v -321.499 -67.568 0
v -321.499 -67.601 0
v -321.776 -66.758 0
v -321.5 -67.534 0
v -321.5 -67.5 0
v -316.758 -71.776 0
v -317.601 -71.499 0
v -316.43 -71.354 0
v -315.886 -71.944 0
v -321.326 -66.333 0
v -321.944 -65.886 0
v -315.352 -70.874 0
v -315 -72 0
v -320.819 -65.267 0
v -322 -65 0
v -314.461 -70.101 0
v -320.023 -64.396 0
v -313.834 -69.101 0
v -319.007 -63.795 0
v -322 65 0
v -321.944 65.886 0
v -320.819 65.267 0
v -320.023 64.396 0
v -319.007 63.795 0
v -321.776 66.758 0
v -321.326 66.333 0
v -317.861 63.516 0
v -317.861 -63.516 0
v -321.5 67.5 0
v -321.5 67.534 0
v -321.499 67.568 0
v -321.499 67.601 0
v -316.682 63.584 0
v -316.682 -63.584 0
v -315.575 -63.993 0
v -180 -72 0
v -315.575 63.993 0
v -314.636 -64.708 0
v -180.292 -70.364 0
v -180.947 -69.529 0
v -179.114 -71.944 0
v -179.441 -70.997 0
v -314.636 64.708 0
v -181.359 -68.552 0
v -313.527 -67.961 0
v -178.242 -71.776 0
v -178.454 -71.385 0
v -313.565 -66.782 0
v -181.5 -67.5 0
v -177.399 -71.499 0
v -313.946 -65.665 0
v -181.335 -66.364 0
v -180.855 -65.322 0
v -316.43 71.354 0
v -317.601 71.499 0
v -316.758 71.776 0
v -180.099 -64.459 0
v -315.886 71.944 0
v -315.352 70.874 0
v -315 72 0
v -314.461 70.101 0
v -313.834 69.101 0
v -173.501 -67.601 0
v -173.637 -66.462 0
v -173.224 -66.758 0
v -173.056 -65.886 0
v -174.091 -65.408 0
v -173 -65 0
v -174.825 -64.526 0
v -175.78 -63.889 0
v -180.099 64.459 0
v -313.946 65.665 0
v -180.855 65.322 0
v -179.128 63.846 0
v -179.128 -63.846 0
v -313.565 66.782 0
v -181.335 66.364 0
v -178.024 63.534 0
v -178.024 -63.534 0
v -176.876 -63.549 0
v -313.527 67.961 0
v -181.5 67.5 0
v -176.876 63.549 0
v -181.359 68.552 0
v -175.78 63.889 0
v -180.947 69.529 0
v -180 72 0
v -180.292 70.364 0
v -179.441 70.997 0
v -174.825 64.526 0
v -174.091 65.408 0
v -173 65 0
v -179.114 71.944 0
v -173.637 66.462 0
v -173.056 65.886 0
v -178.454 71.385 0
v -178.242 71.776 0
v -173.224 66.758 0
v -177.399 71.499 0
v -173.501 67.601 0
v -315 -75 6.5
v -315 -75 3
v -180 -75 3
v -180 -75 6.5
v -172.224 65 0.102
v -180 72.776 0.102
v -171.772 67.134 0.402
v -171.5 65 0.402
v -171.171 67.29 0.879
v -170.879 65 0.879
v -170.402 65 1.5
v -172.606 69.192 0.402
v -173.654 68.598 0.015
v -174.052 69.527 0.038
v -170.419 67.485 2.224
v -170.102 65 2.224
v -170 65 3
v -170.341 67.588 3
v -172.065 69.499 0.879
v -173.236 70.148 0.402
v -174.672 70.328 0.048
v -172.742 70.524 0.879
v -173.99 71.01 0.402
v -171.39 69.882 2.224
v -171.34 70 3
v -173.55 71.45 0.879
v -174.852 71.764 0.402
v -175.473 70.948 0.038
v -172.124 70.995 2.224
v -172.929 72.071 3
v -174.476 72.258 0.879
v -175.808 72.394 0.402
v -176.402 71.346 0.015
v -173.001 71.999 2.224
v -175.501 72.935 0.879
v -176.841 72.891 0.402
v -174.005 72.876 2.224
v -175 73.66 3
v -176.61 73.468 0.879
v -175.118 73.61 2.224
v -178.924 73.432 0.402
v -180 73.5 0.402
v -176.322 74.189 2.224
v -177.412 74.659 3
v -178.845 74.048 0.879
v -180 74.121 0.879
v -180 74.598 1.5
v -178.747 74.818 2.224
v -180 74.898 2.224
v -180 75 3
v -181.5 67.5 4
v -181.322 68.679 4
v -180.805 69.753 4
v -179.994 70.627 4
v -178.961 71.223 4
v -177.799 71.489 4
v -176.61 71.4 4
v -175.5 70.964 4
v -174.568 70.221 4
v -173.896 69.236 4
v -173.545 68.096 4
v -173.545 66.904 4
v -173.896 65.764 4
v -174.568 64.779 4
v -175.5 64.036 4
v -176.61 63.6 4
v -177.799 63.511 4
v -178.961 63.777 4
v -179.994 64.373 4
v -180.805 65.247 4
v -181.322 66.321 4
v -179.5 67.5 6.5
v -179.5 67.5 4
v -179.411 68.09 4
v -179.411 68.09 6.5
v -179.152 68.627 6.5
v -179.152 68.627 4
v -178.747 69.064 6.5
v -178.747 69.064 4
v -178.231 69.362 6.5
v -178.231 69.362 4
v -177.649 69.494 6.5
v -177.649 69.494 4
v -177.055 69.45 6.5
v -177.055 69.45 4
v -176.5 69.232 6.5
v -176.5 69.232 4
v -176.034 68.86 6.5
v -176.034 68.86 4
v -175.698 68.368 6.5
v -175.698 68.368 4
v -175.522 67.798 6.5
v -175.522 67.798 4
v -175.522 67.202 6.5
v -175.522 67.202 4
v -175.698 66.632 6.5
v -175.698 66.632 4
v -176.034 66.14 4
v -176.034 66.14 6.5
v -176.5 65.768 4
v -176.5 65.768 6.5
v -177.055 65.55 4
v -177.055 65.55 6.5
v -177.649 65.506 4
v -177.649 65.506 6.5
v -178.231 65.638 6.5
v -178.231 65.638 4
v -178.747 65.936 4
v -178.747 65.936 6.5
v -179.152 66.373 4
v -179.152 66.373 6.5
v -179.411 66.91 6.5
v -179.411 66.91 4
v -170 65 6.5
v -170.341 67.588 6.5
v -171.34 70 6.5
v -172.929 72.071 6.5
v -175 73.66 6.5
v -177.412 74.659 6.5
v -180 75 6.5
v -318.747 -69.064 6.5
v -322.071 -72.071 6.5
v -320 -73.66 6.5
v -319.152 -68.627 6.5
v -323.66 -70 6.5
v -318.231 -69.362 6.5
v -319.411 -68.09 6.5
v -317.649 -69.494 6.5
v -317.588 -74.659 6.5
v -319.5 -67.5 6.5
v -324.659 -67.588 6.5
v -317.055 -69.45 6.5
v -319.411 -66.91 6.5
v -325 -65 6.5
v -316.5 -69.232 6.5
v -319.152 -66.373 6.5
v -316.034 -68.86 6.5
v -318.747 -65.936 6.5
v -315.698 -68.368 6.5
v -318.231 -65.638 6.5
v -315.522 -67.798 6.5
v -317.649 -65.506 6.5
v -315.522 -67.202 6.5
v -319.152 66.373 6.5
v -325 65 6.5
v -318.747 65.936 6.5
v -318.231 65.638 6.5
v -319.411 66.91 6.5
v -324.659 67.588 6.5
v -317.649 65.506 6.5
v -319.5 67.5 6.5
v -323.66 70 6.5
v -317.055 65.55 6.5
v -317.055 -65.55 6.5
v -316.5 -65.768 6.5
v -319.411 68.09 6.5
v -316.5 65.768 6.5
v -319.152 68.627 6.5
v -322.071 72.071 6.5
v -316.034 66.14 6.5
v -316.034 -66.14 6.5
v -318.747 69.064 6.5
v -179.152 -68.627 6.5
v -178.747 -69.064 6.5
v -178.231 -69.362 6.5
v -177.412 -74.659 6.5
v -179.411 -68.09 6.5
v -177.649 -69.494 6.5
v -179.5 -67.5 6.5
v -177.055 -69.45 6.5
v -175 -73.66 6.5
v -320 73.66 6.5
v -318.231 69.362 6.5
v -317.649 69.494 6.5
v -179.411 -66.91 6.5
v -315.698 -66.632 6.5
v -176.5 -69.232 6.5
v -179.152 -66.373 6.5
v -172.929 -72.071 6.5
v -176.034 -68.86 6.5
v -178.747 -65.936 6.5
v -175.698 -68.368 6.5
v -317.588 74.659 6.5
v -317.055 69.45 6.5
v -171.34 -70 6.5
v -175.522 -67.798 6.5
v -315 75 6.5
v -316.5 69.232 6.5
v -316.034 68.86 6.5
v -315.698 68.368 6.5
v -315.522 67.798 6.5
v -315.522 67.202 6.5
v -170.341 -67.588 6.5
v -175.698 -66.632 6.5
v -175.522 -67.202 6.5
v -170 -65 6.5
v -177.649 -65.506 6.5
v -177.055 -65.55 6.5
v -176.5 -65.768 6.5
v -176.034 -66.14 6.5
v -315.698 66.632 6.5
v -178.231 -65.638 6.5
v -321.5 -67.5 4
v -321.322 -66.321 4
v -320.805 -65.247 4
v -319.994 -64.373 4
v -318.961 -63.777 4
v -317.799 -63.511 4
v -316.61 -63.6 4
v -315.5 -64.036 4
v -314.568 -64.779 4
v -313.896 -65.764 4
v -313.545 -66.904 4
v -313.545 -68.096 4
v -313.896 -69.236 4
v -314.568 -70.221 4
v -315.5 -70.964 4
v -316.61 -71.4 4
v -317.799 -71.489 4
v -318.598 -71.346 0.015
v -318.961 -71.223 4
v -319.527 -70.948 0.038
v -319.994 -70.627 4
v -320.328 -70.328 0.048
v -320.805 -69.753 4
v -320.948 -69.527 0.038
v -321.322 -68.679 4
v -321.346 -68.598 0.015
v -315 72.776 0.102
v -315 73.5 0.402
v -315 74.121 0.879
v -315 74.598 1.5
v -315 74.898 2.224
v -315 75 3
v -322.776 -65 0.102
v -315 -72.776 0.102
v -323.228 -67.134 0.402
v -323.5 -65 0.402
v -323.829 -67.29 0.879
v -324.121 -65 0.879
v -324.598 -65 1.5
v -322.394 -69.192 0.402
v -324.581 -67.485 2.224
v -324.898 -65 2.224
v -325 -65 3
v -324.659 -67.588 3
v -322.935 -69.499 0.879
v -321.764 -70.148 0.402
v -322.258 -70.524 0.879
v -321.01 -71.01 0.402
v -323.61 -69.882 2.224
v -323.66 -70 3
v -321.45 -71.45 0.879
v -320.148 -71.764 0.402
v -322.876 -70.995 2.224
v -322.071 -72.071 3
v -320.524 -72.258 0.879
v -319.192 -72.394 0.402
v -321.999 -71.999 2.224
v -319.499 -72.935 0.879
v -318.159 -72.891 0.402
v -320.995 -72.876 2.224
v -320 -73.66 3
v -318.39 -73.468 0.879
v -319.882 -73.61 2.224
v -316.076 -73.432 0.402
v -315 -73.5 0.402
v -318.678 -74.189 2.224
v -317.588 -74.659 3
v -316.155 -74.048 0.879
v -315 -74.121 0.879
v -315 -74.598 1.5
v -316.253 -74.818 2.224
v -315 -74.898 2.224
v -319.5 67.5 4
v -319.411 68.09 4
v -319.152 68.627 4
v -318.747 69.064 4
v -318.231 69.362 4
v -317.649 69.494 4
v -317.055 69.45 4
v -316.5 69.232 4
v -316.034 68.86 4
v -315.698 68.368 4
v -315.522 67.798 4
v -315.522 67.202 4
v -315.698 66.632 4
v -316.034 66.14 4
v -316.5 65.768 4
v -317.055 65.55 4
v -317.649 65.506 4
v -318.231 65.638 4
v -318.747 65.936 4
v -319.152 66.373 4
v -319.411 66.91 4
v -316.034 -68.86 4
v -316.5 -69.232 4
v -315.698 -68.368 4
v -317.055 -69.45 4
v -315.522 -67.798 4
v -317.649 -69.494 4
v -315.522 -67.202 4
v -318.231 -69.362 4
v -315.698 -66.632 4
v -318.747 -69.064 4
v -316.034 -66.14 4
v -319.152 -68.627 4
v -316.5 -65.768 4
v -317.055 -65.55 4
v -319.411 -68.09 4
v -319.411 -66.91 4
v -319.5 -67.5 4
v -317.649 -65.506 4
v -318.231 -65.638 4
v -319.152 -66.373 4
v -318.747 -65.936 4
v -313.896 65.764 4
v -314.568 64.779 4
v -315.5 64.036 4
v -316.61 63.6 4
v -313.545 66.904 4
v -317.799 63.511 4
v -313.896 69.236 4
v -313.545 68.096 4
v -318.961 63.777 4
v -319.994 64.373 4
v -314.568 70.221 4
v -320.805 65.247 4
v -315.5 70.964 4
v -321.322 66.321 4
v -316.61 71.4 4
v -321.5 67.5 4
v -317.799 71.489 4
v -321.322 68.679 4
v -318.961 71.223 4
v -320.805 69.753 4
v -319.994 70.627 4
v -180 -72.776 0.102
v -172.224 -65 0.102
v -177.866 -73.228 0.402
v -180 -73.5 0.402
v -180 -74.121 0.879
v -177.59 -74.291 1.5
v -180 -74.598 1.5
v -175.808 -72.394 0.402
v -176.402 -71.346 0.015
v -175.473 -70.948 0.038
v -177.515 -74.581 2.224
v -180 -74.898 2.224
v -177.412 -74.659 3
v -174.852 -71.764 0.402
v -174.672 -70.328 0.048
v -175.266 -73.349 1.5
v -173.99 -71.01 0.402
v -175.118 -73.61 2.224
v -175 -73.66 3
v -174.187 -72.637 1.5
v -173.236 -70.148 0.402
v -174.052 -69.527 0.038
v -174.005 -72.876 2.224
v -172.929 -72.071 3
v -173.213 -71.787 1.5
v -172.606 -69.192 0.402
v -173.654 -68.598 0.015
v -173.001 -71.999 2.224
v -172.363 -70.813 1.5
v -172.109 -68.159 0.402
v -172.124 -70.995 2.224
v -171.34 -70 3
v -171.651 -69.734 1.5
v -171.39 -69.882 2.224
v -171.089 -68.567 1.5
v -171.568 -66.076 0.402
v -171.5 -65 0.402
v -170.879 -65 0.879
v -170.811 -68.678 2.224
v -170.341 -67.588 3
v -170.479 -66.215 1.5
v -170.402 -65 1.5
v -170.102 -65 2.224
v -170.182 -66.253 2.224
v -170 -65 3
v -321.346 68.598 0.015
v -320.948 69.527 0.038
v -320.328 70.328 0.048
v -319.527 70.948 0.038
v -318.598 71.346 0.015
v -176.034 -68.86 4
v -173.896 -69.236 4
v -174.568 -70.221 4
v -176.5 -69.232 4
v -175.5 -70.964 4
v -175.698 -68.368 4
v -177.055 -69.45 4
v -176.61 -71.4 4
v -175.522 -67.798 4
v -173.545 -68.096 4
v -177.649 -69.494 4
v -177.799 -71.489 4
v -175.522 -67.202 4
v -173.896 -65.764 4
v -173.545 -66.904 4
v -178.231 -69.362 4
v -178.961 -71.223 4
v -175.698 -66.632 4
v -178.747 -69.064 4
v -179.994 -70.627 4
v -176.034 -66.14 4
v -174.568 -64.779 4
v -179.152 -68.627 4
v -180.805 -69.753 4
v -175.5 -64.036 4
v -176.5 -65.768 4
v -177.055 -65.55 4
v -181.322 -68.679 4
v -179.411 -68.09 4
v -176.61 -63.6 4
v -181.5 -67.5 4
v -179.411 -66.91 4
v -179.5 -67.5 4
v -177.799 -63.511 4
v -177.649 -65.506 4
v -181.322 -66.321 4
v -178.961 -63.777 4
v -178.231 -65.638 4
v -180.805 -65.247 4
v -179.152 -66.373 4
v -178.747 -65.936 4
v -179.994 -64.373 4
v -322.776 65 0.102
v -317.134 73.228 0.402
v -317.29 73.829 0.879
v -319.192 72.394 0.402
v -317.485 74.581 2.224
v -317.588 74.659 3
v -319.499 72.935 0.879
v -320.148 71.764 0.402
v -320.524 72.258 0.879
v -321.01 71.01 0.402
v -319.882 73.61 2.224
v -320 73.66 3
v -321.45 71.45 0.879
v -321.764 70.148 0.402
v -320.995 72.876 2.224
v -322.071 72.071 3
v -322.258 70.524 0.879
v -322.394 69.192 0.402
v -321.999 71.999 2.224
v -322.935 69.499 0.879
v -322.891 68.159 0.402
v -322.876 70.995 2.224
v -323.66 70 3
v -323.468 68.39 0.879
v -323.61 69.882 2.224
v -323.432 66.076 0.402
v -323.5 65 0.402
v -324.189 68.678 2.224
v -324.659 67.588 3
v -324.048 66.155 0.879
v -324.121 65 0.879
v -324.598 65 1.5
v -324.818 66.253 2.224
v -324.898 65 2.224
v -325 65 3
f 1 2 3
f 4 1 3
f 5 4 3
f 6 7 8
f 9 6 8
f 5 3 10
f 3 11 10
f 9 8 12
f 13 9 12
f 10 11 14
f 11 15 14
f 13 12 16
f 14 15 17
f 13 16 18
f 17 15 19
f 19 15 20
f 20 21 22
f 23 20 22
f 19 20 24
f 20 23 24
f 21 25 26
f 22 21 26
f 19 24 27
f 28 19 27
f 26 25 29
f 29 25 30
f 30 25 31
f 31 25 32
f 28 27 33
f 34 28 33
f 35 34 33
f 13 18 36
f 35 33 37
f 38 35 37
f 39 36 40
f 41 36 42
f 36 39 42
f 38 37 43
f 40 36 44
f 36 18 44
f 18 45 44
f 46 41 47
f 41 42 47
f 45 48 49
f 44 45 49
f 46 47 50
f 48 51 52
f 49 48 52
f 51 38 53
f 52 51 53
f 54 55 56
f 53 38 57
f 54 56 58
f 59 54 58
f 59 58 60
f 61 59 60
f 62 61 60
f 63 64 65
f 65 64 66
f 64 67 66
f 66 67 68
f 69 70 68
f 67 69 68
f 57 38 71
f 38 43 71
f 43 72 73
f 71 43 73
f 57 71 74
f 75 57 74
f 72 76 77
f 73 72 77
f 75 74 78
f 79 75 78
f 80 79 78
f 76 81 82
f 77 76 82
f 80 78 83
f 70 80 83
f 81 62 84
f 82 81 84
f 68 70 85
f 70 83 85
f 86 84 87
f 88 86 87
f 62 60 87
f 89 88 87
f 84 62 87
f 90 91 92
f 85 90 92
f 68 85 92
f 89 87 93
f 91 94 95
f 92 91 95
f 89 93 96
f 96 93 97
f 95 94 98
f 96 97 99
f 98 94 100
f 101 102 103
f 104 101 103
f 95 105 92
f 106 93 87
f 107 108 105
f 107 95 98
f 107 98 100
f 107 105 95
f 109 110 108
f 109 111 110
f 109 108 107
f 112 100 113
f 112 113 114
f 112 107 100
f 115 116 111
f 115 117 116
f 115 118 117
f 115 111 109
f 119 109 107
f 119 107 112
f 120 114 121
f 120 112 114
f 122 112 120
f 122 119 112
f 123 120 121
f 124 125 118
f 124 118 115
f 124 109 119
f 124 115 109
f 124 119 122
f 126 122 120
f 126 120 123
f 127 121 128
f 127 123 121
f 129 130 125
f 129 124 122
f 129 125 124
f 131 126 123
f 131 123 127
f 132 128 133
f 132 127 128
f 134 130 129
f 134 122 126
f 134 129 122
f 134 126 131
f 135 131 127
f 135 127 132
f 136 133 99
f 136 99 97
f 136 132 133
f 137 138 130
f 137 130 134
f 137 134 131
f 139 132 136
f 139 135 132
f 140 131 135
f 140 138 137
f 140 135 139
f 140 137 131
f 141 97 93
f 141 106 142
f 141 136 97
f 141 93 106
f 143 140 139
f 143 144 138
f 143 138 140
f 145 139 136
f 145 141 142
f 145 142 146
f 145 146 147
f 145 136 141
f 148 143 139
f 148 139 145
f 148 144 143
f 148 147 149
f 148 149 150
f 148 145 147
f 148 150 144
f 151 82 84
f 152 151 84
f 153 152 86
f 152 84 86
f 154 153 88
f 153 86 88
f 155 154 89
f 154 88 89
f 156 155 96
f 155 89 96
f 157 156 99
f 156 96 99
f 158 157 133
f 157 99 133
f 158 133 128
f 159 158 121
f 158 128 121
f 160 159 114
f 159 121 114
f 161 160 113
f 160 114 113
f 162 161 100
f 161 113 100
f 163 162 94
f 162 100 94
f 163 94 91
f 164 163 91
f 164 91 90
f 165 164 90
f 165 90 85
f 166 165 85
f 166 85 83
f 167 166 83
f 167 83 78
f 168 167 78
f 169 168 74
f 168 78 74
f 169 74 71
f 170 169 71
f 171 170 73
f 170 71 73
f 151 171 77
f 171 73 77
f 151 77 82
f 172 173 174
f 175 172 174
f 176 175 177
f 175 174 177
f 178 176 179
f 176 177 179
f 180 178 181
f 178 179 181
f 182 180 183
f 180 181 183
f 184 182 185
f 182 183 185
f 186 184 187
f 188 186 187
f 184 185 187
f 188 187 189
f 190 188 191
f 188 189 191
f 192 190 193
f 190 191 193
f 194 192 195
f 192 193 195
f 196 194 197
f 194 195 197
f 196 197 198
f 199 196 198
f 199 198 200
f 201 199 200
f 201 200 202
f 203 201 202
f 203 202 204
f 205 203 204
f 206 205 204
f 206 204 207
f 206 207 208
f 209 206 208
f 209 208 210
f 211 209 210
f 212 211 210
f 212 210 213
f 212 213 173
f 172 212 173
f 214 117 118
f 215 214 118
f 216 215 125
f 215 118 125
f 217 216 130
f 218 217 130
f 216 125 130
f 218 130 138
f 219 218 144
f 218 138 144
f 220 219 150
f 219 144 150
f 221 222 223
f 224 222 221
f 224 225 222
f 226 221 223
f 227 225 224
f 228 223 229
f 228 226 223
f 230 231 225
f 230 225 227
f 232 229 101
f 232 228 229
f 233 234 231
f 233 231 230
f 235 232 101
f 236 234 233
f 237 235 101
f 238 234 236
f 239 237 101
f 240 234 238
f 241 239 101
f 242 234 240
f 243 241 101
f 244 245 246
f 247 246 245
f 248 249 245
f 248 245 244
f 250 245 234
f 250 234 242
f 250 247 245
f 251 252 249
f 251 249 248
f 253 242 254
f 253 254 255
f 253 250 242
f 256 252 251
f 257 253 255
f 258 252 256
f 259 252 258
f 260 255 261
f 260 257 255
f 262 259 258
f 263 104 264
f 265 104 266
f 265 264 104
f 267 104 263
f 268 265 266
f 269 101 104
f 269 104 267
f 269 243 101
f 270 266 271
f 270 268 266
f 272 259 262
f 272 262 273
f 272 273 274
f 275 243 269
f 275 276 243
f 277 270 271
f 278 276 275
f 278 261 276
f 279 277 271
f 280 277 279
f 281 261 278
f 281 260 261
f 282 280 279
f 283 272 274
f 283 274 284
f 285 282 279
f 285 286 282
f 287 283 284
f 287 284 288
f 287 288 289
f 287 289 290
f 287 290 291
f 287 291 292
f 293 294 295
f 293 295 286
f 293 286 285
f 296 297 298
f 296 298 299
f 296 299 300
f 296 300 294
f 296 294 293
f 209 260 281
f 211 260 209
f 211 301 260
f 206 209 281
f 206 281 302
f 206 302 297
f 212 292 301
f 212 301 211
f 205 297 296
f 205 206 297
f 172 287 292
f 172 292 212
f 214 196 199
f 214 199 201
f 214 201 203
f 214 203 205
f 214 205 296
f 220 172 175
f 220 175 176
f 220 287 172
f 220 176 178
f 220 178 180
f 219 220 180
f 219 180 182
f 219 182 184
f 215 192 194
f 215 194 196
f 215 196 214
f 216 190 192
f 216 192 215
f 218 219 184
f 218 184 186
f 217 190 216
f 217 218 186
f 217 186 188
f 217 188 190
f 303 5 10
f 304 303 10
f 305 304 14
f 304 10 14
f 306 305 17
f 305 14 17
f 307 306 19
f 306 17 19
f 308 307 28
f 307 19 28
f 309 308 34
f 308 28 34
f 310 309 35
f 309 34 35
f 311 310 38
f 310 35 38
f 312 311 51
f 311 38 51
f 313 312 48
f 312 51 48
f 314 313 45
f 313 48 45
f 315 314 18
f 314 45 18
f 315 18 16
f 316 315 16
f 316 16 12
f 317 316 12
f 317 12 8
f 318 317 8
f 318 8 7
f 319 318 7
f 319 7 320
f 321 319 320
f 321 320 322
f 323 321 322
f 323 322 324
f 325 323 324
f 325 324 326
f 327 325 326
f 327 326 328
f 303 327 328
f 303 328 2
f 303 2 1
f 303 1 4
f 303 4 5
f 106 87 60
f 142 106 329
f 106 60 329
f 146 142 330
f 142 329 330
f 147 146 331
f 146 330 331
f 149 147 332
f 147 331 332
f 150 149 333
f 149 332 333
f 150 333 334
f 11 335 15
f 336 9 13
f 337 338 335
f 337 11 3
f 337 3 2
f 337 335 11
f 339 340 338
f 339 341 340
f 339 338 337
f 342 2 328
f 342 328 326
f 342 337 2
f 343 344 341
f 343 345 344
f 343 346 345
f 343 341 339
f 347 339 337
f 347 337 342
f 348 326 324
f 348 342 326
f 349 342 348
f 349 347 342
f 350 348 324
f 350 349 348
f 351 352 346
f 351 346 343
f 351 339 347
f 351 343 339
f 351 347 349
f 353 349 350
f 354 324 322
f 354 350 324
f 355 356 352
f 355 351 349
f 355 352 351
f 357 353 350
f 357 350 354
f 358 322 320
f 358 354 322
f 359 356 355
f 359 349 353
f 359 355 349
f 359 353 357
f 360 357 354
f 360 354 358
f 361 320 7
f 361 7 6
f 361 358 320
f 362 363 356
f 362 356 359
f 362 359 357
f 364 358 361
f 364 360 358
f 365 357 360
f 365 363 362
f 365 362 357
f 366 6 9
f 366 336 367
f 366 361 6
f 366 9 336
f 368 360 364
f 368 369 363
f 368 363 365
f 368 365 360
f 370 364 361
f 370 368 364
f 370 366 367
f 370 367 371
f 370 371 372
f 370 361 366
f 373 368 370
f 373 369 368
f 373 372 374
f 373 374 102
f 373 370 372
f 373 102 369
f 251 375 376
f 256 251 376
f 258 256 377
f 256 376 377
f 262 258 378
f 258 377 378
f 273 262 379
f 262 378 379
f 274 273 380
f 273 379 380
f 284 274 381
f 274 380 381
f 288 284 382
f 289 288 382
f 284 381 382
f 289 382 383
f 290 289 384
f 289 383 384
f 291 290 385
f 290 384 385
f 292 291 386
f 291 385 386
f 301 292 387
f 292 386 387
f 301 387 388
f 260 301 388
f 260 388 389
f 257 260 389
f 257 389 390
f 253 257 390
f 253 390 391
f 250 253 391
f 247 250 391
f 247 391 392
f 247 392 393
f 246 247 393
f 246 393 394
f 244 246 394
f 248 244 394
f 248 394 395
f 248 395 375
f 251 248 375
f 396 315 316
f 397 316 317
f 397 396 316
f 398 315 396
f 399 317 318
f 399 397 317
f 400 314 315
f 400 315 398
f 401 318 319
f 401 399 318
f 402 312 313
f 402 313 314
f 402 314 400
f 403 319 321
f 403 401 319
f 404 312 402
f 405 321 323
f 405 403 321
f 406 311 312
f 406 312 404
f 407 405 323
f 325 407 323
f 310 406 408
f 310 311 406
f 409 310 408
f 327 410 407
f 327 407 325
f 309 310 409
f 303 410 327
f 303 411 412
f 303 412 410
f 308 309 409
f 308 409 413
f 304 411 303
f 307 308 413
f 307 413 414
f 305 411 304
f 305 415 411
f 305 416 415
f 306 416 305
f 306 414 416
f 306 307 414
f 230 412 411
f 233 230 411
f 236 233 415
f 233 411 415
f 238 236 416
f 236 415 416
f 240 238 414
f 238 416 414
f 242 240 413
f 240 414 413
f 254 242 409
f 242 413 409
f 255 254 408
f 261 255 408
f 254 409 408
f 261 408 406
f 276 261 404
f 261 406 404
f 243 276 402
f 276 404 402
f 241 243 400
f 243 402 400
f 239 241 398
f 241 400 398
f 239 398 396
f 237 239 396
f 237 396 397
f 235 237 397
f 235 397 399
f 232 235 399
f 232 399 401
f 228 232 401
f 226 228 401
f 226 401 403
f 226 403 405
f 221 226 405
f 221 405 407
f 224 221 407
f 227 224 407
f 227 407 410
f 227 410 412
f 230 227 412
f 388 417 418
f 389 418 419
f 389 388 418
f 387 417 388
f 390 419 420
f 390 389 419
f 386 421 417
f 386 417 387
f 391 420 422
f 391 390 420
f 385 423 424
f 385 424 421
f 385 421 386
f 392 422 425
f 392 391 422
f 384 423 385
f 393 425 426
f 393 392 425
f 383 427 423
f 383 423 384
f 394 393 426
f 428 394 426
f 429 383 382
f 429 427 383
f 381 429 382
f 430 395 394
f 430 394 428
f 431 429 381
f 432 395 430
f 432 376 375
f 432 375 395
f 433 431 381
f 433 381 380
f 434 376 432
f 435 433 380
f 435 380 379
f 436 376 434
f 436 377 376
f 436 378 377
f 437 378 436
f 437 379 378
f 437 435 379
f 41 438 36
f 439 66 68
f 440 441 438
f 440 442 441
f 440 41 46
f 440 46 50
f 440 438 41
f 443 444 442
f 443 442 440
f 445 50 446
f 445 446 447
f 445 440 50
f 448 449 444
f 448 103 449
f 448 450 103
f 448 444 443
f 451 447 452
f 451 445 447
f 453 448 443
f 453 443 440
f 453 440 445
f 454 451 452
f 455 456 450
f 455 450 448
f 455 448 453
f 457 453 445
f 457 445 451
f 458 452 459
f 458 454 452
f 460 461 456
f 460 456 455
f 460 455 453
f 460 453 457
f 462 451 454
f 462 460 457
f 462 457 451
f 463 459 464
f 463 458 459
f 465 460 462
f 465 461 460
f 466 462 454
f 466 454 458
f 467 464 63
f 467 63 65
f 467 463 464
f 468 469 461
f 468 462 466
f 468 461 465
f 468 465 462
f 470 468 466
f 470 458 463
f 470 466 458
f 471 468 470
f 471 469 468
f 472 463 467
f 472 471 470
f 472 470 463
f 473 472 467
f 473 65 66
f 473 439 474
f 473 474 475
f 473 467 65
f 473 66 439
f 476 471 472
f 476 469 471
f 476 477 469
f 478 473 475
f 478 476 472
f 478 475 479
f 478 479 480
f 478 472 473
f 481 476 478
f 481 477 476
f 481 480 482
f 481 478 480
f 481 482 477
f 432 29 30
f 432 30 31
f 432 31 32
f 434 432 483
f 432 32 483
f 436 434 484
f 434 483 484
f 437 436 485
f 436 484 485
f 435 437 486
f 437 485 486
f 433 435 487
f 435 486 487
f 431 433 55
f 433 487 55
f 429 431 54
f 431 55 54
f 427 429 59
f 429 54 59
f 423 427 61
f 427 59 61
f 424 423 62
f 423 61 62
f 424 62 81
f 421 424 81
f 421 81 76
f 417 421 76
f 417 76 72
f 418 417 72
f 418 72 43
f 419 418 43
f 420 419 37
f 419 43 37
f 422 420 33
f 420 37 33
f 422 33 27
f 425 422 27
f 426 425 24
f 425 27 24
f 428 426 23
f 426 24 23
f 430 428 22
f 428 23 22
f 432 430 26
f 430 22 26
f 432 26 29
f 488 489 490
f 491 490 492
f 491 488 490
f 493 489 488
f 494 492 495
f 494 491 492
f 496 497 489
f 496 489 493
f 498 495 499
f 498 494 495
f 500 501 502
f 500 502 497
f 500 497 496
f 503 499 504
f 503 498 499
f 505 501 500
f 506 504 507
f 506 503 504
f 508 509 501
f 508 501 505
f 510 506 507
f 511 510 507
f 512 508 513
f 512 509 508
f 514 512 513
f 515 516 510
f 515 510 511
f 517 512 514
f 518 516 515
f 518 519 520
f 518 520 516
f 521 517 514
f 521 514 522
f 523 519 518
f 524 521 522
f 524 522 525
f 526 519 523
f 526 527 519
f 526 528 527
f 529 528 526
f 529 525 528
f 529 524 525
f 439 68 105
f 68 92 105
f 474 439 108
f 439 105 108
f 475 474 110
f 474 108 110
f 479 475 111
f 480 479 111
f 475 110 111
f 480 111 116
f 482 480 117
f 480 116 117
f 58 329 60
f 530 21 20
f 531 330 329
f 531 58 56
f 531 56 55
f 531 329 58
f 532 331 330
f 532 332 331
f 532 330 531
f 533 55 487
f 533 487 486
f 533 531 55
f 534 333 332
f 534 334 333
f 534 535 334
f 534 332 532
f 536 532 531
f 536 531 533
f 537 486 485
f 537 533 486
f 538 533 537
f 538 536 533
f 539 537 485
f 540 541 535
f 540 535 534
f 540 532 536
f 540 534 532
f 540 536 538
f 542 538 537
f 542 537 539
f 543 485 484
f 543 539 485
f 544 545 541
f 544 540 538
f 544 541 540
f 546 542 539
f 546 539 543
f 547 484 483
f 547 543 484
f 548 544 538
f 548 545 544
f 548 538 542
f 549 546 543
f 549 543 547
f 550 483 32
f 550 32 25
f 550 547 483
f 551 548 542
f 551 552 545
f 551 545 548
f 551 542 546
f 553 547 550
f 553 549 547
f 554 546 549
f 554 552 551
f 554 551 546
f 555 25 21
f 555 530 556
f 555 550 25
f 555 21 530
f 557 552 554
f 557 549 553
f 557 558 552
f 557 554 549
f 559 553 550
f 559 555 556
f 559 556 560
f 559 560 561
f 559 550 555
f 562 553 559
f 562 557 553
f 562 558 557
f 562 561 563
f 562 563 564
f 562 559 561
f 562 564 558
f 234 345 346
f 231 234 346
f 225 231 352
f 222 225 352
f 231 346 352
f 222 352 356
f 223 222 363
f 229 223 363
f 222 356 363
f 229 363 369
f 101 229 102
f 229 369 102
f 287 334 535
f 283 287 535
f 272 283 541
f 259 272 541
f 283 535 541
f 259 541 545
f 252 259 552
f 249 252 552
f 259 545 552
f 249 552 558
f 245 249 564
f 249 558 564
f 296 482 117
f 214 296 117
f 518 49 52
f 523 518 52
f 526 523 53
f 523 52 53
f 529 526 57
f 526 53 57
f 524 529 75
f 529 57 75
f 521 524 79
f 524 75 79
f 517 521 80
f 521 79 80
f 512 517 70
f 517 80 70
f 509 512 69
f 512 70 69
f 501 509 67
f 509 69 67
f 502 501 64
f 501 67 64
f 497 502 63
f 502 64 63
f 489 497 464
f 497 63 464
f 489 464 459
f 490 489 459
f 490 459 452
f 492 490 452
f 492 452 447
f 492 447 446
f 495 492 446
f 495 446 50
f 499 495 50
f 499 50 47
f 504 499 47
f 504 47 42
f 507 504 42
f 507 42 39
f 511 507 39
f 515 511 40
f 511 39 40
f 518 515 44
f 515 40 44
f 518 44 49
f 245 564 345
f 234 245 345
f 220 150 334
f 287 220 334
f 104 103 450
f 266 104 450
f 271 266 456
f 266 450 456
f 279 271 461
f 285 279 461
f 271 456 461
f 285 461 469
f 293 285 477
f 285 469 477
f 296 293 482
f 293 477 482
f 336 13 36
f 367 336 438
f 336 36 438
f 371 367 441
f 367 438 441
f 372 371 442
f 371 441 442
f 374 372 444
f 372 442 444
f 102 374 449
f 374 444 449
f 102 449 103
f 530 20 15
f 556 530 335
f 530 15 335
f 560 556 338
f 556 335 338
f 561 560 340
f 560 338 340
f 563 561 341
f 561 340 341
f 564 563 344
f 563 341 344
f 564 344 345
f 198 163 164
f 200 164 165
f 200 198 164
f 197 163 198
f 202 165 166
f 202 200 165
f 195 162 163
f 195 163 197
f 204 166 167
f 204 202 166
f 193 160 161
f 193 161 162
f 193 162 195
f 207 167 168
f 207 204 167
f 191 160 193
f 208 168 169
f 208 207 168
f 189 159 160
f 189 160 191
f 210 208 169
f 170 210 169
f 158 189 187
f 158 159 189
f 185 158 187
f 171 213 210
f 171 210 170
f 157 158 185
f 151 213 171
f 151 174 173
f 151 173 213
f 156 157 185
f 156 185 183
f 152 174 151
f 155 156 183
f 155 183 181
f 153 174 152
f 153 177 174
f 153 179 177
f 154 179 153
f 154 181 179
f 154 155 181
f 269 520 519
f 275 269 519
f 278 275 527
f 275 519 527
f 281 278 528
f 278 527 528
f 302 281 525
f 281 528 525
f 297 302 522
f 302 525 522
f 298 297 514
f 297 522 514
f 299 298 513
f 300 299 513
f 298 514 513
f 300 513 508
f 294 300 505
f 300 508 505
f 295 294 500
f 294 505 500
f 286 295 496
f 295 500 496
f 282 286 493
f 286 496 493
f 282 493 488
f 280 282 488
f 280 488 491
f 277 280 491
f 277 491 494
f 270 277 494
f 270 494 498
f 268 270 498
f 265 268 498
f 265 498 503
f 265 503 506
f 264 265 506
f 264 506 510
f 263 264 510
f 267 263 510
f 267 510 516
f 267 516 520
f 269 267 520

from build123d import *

# Parameters (mm, degrees)
SKETCH1_R           = 1.25
BOSS_EXTRUDE1_DEPTH = 6.5
SKETCH2_R           = 2
CUT_EXTRUDE1_DEPTH  = 334.604931019
FILLET1_R           = 3
SKETCH3_R           = 4
CUT_EXTRUDE2_DEPTH  = 4


with BuildPart() as part:
    # Sketch1 → Boss-Extrude1 (new body)
    with BuildSketch(Plane.XY):
        with BuildLine():
            Line((-315, -75), (-180, -75))
            ThreePointArc((-180, -75), (-172.928932188, -72.071067812), (-170, -65))
            Line((-170, -65), (-170, 65))
            ThreePointArc((-170, 65), (-172.928932188, 72.071067812), (-180, 75))
            Line((-180, 75), (-315, 75))
            ThreePointArc((-315, 75), (-322.071067812, 72.071067812), (-325, 65))
            Line((-325, 65), (-325, -65))
            ThreePointArc((-325, -65), (-322.071067812, -72.071067812), (-315, -75))
        make_face()
        with Locations(Location((-317.5, -67.5, 0), (0, 0, 180))):
            Circle(SKETCH1_R, mode=Mode.SUBTRACT)
        with Locations(Location((-177.5, -67.5, 0), (0, 0, 180))):
            Circle(SKETCH1_R, mode=Mode.SUBTRACT)
        with Locations(Location((-177.5, 67.5, 0), (0, 0, 180))):
            Circle(SKETCH1_R, mode=Mode.SUBTRACT)
        with Locations(Location((-317.5, 67.5, 0), (0, 0, 180))):
            Circle(SKETCH1_R, mode=Mode.SUBTRACT)
    extrude(amount=BOSS_EXTRUDE1_DEPTH)

    # Sketch2 → Cut-Extrude1 (cut, through all)
    with BuildSketch(Plane(origin=(0, 0, 0), x_dir=(-1, 0, 0), z_dir=(0, 0, -1))):
        with Locations((177.5, 67.5)):
            Circle(SKETCH2_R)
        with Locations((317.5, 67.5)):
            Circle(SKETCH2_R)
        with Locations((317.5, -67.5)):
            Circle(SKETCH2_R)
        with Locations((177.5, -67.5)):
            Circle(SKETCH2_R)
    extrude(amount=-CUT_EXTRUDE1_DEPTH, mode=Mode.SUBTRACT)

    # Fillet1
    fillet1_edges = [part.edges().sort_by_distance(p)[0] for p in [
        (-170, 0, 0),
        (-172.928932188, -72.071067812, 0),
        (-247.5, -75, 0),
        (-322.071067812, -72.071067812, 0),
        (-325, 0, 0),
        (-322.071067812, 72.071067812, 0),
        (-247.5, 75, 0),
        (-172.928932188, 72.071067812, 0),
    ]]
    fillet(fillet1_edges, radius=FILLET1_R)

    # Sketch3 → Cut-Extrude2 (cut)
    with BuildSketch(Plane(origin=(0, 0, 0), x_dir=(-1, 0, 0), z_dir=(0, 0, -1))):
        with Locations((177.5, 67.5)):
            Circle(SKETCH3_R)
        with Locations((317.5, 67.5)):
            Circle(SKETCH3_R)
        with Locations((177.5, -67.5)):
            Circle(SKETCH3_R)
        with Locations((317.5, -67.5)):
            Circle(SKETCH3_R)
    extrude(amount=-CUT_EXTRUDE2_DEPTH, mode=Mode.SUBTRACT)


solid = part.part
